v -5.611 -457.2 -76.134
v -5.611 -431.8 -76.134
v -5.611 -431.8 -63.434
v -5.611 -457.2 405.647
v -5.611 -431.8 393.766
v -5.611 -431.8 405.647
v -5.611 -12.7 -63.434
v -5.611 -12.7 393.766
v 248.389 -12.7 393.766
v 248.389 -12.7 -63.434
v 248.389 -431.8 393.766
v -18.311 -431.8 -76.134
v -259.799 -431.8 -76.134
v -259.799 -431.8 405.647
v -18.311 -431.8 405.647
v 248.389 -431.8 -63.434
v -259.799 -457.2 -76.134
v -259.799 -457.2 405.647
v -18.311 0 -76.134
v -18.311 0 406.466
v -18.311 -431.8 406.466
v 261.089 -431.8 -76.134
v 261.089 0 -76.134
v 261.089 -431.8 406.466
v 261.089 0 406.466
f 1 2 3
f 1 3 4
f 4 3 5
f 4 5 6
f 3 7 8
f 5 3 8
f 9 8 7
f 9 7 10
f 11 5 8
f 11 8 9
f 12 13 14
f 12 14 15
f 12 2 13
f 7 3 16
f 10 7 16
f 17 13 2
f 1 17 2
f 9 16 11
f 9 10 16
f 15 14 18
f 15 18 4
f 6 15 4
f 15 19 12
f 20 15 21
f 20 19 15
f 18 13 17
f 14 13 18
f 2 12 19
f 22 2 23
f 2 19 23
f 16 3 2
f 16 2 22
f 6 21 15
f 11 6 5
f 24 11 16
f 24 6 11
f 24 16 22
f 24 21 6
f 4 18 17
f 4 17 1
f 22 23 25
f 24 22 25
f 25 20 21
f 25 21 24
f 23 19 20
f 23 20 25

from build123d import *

# Parameters (mm, degrees)
F0_W     = 279.4
F0_H     = 482.6
F1_DEPTH = 431.8
F2_T     = -12.7
F3_W     = 254.188428
F3_H     = 481.781103
F4_DEPTH = 25.4


with BuildPart() as f1:
    # F0 (on Front) → F1 (new body)
    with BuildSketch(Plane.XZ):
        with Locations((121.389246, 165.165817)):
            Rectangle(F0_W, F0_H)
    extrude(amount=F1_DEPTH)

    # F2
    f2_openings = [f1.faces().sort_by_distance(p)[0] for p in [
        (121.389246, -431.8, 165.165817),
    ]]
    offset(amount=F2_T, openings=f2_openings)

    # F3 (on face) → F4 (join)
    with BuildSketch(Plane.XZ.offset(431.8)):
        with Locations((-132.704968, 164.756368)):
            Rectangle(F3_W, F3_H)
    extrude(amount=F4_DEPTH)


solid = f1.part
